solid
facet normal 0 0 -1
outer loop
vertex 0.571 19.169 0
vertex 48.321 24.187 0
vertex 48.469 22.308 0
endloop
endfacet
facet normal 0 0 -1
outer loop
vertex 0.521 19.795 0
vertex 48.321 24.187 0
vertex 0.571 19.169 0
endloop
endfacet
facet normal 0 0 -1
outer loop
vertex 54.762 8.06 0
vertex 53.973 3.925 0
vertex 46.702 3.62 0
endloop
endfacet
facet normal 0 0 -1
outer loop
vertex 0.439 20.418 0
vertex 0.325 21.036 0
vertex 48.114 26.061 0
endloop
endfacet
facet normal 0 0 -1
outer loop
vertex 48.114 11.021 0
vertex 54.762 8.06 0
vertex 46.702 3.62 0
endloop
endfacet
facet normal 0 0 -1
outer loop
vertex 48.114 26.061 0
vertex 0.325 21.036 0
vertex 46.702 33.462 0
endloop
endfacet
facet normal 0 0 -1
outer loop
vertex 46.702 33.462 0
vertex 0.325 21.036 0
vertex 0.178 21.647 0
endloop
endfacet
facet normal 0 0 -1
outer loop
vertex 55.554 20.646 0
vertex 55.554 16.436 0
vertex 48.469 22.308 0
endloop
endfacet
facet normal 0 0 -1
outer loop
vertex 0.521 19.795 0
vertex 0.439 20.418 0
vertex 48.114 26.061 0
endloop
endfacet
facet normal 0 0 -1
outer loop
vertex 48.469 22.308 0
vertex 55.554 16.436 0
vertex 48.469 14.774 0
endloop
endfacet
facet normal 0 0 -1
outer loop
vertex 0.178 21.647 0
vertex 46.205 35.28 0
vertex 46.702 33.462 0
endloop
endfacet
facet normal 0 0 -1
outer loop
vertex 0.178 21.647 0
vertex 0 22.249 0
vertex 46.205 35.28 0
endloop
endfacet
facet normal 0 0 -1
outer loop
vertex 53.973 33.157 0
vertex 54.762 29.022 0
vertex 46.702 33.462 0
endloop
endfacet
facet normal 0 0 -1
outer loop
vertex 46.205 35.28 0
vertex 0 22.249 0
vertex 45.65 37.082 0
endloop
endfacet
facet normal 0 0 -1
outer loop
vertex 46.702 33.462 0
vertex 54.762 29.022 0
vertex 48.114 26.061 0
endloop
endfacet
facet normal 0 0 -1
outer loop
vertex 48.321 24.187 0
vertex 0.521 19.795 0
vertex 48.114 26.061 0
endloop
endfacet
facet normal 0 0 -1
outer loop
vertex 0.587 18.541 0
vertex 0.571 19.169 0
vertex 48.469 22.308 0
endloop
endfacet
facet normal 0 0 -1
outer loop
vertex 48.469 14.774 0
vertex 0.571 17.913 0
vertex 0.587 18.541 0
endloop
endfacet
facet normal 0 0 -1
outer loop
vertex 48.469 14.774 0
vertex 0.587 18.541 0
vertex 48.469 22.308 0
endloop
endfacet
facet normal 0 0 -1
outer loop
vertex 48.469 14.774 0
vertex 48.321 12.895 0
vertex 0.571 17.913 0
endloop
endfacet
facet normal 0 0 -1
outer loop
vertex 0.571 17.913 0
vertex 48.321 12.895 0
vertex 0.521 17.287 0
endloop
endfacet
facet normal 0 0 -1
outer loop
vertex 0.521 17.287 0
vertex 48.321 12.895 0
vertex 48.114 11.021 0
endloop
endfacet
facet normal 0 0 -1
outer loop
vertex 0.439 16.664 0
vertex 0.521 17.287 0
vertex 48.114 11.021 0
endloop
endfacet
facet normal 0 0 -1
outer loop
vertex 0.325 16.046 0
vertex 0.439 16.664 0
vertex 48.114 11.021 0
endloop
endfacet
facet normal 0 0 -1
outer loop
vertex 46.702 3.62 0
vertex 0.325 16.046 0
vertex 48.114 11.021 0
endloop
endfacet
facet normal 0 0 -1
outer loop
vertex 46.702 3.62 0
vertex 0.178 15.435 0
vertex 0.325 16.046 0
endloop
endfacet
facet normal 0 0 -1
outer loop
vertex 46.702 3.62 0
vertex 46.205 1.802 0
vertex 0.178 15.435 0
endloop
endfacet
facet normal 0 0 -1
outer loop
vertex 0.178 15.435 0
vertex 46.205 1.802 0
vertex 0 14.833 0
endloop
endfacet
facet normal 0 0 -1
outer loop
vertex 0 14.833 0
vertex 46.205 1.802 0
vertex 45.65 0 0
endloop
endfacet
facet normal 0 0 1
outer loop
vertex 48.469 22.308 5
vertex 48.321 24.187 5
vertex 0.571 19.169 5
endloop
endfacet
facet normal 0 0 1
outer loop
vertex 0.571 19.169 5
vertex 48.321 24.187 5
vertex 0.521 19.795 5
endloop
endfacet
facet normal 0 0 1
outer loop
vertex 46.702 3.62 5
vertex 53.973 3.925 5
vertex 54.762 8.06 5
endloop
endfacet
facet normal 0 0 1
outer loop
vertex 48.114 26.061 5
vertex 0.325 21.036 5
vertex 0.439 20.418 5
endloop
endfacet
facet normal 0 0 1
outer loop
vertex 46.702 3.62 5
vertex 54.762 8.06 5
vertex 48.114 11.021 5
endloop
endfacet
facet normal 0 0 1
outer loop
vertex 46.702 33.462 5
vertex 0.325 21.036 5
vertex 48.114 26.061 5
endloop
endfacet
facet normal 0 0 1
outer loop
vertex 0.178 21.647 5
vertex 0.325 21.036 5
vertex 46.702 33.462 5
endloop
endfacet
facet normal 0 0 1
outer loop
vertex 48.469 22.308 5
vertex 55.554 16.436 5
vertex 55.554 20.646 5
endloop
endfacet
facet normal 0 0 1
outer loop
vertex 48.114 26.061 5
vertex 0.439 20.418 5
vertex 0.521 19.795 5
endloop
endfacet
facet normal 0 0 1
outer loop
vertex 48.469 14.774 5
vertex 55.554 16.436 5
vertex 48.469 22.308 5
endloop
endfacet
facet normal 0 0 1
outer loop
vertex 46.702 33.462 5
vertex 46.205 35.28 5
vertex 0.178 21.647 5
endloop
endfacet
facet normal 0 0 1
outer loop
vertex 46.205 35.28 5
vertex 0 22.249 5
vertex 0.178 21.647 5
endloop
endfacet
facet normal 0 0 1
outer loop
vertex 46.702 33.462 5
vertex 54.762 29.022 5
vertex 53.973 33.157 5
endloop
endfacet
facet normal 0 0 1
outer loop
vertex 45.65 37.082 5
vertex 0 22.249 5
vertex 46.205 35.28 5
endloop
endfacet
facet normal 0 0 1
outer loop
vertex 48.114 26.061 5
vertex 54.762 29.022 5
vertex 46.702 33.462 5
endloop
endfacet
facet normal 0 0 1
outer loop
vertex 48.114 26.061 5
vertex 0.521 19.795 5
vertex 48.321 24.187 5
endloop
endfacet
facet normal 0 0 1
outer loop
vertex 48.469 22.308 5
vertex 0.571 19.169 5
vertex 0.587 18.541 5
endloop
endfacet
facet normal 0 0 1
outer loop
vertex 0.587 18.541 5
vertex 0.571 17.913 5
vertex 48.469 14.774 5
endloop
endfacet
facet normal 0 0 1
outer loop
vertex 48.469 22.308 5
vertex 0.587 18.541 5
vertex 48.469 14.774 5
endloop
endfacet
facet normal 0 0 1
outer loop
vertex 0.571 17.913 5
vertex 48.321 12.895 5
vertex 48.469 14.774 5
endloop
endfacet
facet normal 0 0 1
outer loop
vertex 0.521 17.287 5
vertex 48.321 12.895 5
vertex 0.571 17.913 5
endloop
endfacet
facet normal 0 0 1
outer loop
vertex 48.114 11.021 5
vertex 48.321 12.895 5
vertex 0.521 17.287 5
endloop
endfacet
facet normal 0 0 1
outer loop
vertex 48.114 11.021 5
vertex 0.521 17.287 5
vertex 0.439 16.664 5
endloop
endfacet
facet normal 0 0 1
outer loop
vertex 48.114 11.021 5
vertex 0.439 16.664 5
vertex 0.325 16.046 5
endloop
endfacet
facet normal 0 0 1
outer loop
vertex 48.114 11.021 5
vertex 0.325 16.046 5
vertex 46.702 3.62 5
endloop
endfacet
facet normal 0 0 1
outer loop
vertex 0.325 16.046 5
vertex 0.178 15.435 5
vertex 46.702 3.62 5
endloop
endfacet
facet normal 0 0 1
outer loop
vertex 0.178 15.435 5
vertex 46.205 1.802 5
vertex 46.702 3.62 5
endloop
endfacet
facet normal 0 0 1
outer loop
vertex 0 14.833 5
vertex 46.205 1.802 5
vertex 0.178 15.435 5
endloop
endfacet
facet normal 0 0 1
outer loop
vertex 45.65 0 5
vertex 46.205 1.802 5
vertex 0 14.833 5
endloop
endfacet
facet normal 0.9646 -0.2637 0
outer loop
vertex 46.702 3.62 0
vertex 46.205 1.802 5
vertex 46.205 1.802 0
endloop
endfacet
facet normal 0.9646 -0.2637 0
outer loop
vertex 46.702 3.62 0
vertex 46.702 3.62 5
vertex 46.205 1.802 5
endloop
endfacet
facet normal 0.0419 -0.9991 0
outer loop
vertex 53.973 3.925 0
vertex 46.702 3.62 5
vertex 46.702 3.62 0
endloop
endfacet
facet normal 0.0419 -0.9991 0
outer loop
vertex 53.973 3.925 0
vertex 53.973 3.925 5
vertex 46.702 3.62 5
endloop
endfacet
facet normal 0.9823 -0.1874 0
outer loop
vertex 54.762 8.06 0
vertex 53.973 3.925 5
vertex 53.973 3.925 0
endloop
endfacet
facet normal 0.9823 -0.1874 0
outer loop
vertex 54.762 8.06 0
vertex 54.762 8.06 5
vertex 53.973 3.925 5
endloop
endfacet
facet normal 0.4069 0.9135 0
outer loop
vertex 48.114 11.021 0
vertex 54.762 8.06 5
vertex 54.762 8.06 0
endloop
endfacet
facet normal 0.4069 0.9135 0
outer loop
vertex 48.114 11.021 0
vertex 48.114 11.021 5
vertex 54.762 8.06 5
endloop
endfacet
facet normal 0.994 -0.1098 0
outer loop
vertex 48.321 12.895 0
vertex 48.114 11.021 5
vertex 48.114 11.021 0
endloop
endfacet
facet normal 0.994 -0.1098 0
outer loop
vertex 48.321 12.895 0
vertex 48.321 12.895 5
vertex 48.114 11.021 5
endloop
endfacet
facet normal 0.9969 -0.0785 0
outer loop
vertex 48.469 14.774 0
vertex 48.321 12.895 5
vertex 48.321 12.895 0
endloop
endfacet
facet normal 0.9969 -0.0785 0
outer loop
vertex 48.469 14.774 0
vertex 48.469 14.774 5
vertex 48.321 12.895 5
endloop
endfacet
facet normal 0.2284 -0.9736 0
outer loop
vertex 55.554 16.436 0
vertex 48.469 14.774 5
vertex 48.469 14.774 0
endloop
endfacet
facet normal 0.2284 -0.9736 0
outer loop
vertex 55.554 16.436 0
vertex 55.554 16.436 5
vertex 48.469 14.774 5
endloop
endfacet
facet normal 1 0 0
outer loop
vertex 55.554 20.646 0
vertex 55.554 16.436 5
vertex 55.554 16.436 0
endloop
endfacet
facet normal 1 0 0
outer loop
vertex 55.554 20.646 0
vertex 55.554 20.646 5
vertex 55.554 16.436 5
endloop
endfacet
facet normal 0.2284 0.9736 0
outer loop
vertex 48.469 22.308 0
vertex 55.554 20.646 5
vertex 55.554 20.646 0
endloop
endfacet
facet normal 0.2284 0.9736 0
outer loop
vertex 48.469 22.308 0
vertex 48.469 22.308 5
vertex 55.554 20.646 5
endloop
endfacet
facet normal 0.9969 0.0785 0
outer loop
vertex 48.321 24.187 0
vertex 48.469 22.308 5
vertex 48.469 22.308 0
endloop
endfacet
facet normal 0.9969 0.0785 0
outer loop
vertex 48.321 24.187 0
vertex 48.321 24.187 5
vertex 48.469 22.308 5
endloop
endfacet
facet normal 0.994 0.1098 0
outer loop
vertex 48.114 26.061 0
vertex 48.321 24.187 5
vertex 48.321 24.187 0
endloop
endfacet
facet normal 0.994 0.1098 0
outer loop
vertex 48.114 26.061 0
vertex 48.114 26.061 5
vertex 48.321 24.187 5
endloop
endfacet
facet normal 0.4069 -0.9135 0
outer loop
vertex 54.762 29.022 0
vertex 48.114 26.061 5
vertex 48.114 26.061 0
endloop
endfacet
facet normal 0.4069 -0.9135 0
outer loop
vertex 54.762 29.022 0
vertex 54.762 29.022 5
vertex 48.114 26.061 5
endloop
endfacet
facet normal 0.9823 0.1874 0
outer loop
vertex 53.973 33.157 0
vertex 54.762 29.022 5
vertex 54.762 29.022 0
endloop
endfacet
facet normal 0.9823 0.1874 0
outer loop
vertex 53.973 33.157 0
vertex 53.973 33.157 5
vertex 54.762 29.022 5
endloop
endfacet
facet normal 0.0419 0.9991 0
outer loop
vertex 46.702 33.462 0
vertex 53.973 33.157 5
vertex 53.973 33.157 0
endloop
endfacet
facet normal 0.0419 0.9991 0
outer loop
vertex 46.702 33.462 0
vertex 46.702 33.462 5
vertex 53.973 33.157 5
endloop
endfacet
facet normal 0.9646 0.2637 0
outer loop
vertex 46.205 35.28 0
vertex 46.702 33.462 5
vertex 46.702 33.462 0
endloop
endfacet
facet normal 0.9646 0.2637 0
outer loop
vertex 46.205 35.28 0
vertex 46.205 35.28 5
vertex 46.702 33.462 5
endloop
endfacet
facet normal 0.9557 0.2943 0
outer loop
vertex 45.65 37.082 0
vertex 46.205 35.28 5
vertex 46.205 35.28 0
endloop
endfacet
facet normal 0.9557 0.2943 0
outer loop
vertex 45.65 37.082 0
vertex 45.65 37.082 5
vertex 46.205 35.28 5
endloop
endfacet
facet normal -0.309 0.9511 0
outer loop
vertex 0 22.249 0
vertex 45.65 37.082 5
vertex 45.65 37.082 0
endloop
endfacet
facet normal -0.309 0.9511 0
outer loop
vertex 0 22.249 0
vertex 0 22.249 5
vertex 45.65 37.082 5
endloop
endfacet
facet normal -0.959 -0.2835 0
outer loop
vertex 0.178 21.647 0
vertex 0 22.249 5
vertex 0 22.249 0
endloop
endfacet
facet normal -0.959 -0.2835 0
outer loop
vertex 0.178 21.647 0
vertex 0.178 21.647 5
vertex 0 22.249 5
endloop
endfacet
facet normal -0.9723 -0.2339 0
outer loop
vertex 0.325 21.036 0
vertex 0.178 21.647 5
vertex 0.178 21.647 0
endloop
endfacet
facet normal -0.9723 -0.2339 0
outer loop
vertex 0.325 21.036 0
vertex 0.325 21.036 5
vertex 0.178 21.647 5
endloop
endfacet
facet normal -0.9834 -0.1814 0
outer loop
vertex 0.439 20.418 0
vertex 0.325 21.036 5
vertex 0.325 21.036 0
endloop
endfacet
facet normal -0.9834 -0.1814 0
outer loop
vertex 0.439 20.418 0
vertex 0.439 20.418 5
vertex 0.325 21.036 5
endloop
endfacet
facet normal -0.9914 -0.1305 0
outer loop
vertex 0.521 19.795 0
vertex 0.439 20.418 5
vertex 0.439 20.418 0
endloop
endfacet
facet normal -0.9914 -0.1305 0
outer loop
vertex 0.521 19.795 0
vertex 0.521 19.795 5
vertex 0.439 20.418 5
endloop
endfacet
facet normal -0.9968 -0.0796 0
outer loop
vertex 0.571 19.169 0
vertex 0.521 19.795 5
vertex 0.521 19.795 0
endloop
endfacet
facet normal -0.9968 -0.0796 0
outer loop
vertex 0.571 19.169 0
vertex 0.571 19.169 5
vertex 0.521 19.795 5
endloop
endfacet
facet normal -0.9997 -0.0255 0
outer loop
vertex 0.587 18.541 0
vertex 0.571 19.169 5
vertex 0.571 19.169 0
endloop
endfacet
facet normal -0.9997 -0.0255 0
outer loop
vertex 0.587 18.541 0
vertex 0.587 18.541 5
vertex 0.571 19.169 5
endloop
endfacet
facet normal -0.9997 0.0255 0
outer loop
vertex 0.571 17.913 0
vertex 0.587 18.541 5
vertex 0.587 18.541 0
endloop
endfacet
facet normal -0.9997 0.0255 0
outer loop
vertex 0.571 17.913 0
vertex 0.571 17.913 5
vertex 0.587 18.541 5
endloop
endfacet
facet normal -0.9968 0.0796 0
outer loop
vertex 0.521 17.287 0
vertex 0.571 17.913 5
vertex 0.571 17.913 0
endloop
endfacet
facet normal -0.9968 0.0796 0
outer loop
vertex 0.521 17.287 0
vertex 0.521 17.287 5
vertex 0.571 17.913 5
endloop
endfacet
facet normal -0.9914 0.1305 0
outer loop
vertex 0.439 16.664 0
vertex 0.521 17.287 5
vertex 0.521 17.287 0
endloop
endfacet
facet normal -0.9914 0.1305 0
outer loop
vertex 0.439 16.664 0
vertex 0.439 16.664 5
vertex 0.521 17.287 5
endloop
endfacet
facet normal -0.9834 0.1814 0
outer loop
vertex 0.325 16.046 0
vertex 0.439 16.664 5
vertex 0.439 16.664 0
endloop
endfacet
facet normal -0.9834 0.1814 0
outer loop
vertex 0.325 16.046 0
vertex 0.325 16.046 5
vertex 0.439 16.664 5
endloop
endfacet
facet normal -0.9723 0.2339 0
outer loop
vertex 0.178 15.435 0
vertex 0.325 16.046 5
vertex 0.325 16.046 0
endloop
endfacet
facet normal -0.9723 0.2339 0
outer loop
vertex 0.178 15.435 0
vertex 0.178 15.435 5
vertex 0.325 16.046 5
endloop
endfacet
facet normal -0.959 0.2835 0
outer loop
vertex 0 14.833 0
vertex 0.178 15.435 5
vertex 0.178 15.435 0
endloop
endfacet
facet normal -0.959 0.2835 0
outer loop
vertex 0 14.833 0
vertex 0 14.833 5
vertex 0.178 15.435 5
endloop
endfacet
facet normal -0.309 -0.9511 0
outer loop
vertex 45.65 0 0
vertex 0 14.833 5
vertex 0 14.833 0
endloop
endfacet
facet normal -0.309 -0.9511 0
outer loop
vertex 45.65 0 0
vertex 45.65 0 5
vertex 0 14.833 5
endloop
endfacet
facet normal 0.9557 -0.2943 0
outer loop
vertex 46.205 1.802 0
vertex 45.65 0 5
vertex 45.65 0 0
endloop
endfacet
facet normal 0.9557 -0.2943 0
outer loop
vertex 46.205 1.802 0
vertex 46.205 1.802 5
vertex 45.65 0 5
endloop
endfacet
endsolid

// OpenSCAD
$fn = 32;

// ----------------------------------------------------------------------
// Gear sector: 3 teeth on 36 degrees
// ----------------------------------------------------------------------

// --- parameters (mm) ---
sector_angle = 36;        // sector angle, degrees
root_r = 60;              // root circle radius
tooth_h = 7;              // tooth height over the root circle
teeth = 3;                // number of teeth on the sector
hub_r = 12;               // hub bore radius
plate_t = 5;              // sector thickness, Z
arc_step = 3;             // sampling step of the root/hub arcs, degrees

tip_r = root_r + tooth_h;  // tip circle radius

profile = [[45.65, 0], [46.205, 1.802], [46.702, 3.62], [53.973, 3.925], [54.762, 8.06], [48.114, 11.021], [48.321, 12.895], [48.469, 14.774], [55.554, 16.436], [55.554, 20.646], [48.469, 22.308], [48.321, 24.187], [48.114, 26.061], [54.762, 29.022], [53.973, 33.157], [46.702, 33.462], [46.205, 35.28], [45.65, 37.082], [0, 22.249], [0.178, 21.647], [0.325, 21.036], [0.439, 20.418], [0.521, 19.795], [0.571, 19.169], [0.587, 18.541], [0.571, 17.913], [0.521, 17.287], [0.439, 16.664], [0.325, 16.046], [0.178, 15.435], [0, 14.833]];  // primary outline, 31 points, counter clockwise

// --- the one profile operation ---
linear_extrude(height = plate_t) polygon(points = profile);
